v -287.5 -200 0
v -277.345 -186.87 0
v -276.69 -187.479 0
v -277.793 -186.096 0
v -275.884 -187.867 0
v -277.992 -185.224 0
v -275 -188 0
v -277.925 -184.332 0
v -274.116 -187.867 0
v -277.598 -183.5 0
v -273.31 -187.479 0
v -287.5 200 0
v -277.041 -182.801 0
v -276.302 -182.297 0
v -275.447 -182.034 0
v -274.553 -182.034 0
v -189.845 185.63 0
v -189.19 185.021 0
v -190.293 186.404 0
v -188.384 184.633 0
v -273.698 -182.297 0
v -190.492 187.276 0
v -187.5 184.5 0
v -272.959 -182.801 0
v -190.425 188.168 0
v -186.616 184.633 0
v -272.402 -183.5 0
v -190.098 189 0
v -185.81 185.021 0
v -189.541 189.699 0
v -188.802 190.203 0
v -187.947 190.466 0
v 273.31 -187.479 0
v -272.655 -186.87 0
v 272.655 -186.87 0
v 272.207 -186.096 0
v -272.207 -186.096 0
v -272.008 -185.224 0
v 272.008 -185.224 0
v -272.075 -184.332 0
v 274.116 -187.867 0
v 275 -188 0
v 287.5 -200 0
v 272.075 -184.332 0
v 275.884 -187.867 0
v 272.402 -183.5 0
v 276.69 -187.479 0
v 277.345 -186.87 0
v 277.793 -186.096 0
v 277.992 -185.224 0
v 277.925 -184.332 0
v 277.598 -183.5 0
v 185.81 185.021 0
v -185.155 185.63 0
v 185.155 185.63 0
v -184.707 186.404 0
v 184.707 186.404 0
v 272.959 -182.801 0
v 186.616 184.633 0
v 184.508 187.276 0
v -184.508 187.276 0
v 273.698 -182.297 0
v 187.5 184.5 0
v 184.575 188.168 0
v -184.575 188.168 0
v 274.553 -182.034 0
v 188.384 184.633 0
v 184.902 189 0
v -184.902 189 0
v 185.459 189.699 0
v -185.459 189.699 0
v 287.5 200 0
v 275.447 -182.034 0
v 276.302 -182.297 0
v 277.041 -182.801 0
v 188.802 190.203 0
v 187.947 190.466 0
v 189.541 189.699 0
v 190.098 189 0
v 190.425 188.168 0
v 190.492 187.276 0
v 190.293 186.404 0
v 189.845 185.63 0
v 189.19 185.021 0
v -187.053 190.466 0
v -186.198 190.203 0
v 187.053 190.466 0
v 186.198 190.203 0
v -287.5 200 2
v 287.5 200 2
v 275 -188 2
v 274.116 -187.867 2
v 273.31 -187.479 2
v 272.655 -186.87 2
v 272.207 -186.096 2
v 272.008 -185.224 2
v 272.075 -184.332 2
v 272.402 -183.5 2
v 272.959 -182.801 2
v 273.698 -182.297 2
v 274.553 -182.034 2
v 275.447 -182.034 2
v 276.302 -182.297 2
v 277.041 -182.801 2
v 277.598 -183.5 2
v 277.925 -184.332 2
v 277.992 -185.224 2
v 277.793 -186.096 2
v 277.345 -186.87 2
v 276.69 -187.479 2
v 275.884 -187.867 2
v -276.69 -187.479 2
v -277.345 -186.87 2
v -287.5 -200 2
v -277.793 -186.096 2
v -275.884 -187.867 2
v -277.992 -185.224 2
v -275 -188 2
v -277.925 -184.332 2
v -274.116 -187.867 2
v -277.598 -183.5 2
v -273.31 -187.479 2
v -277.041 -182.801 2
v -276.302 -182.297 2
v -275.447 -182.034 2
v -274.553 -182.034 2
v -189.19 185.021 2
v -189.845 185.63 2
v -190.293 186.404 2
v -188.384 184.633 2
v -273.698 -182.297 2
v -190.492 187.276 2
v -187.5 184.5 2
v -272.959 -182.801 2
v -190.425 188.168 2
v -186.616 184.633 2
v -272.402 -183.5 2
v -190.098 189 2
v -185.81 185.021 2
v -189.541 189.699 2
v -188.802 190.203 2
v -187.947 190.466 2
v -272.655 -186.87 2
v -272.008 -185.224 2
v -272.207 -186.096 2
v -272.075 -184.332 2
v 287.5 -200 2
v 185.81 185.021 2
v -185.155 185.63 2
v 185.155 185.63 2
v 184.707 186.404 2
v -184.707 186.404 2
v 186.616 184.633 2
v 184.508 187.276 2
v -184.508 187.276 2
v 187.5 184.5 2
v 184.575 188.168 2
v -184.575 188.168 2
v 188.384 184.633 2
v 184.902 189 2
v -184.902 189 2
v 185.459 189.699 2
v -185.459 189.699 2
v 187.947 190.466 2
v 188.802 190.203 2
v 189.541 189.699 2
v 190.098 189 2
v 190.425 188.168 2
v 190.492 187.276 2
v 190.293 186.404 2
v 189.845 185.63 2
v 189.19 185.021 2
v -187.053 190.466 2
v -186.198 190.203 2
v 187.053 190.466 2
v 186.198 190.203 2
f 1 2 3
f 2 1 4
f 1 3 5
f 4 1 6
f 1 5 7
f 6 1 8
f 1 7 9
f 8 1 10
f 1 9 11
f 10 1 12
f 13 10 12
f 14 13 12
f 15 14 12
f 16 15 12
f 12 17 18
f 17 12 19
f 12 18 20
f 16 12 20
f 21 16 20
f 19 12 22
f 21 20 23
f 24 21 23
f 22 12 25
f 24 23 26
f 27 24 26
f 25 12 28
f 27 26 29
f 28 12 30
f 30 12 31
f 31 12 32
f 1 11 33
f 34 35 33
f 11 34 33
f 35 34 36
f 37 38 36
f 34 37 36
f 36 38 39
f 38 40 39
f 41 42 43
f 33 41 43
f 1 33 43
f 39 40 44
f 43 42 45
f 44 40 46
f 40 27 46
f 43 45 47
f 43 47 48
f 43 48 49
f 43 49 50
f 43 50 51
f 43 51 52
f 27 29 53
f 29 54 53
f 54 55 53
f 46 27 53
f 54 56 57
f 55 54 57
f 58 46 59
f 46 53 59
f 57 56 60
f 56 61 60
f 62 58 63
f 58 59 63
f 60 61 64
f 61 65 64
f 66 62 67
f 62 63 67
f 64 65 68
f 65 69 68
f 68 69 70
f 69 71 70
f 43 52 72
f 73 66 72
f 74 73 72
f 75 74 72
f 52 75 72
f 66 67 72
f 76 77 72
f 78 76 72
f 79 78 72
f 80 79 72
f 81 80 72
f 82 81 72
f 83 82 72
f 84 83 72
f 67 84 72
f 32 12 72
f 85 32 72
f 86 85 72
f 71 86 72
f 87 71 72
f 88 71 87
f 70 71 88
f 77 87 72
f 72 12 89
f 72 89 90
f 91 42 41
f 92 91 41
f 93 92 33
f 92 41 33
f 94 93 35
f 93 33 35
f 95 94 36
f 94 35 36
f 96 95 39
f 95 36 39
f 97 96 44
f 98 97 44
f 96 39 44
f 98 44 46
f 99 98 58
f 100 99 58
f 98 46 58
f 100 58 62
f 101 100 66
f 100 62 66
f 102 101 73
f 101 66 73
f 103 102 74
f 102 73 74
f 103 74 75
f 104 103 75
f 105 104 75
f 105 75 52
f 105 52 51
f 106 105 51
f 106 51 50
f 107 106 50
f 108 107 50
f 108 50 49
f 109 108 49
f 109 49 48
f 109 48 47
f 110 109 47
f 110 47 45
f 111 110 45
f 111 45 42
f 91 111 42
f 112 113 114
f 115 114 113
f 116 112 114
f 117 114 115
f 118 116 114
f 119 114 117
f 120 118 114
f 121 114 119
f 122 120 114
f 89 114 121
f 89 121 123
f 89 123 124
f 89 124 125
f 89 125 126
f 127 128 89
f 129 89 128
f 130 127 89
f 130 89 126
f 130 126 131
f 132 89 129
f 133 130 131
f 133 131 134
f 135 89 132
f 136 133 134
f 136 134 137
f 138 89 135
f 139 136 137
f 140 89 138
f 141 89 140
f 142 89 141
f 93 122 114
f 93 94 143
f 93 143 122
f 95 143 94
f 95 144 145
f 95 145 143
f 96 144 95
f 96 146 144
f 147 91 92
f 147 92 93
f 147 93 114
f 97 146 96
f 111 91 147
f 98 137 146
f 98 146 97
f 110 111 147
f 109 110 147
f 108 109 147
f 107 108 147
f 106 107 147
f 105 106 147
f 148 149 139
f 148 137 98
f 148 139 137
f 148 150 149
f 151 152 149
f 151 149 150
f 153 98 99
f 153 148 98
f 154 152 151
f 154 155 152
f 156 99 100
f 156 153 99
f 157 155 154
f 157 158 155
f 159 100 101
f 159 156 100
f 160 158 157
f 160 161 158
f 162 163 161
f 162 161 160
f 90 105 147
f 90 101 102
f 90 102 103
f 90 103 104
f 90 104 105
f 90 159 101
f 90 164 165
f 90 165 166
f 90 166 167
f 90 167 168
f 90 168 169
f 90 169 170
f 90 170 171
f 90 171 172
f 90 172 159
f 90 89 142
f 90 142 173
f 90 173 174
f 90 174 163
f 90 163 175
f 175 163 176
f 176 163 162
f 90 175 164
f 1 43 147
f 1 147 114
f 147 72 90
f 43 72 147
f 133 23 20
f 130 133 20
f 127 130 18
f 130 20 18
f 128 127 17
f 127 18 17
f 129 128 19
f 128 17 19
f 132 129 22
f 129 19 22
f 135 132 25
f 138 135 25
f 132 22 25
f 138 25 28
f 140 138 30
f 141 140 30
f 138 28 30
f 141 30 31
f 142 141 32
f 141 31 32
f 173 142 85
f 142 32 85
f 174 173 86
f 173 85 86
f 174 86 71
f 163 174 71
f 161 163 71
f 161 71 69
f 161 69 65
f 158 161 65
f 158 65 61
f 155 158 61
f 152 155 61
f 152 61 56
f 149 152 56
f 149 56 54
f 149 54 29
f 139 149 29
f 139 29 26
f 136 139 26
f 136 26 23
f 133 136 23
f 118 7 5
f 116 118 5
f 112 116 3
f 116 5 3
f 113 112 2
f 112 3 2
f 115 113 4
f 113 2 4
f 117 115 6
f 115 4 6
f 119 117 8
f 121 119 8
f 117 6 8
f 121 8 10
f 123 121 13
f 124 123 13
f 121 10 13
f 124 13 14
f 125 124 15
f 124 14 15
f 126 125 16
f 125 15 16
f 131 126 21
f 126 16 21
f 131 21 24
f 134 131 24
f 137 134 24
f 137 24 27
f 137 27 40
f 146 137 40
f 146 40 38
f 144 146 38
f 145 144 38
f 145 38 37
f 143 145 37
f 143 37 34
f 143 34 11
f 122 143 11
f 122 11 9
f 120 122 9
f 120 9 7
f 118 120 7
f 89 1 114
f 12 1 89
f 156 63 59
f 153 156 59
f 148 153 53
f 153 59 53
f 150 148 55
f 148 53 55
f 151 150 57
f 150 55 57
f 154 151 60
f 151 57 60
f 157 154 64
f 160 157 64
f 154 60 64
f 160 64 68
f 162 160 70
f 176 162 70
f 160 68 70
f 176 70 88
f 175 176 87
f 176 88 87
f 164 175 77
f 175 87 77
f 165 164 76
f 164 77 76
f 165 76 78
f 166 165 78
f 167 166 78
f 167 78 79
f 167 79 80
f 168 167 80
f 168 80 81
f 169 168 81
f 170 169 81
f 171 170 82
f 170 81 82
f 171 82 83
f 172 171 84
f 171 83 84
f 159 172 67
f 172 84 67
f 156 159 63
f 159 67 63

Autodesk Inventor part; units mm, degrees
ref_plane "YZ Plane" through (0, 0, 0) normal (1, 0, 0) x (0, 1, 0)
ref_plane "XZ Plane" through (0, 0, 0) normal (0, 1, 0) x (-1, 0, 0)
ref_plane "XY Plane" through (0, 0, 0) normal (0, 0, 1) x (1, 0, 0)
sketch "Sketch1" plane through (0, 0, 0) normal (0, 0, 1) x (1, 0, 0)
  line L0 (0, 280) -> (0, -280) construction
  line L1 (-402.5, 0) -> (402.5, 0) construction
  line L2 (-287.5, 200) -> (287.5, 200)
  line L3 (287.5, 200) -> (287.5, -200)
  line L4 (287.5, -200) -> (-287.5, -200)
  line L5 (-287.5, -200) -> (-287.5, 200)
  point P0 (0, 0)
  dimension "d0" = 400
  dimension "d1" = 575
extrude "Extrusion1" add sketch "Sketch1" along normal blind 2
sketch "Sketch2" plane through (0, 0, 2) normal (0, 0, 1) x (1, 0, 0)
  line L0 (287.5, 200) -> (-287.5, 200) construction
  line L1 (-287.5, 200) -> (-287.5, -200) construction
  line L2 (-287.5, -200) -> (287.5, -200) construction
  line L3 (287.5, -200) -> (287.5, 200) construction
  line L4 (-287.5, 200) -> (-287.5, -200) construction
  line L5 (-287.5, 187.5) -> (287.5, 187.5) construction
  line L6 (-287.5, -200) -> (287.5, -200) construction
  line L7 (275, -200) -> (275, 200) construction
  line L8 (-275, -200) -> (-275, 200) construction
  line L9 (287.5, 200) -> (-287.5, 200) construction
  point P0 (0, 0)
  point P1 (-187.5, 187.5)
  point P2 (187.5, 187.5)
  point P3 (275, -185)
  point P4 (-275, -185)
  dimension "d4" = 12.5
  dimension "d5" = 12.5
  dimension "d6" = 12.5
  dimension "d7" = 100
  dimension "d8" = 100
  dimension "d9" = 15
  dimension "d18" = 12.5
  dimension "d19" = 15
hole "Hole1" at (187.5, 187.5, 2) at (275, -185, 2) at (-187.5, 187.5, 2) at (-275, -185, 2) direction (0, 0, -1) diameter 6 end through all
properties part number "Side_Cover_V1"
